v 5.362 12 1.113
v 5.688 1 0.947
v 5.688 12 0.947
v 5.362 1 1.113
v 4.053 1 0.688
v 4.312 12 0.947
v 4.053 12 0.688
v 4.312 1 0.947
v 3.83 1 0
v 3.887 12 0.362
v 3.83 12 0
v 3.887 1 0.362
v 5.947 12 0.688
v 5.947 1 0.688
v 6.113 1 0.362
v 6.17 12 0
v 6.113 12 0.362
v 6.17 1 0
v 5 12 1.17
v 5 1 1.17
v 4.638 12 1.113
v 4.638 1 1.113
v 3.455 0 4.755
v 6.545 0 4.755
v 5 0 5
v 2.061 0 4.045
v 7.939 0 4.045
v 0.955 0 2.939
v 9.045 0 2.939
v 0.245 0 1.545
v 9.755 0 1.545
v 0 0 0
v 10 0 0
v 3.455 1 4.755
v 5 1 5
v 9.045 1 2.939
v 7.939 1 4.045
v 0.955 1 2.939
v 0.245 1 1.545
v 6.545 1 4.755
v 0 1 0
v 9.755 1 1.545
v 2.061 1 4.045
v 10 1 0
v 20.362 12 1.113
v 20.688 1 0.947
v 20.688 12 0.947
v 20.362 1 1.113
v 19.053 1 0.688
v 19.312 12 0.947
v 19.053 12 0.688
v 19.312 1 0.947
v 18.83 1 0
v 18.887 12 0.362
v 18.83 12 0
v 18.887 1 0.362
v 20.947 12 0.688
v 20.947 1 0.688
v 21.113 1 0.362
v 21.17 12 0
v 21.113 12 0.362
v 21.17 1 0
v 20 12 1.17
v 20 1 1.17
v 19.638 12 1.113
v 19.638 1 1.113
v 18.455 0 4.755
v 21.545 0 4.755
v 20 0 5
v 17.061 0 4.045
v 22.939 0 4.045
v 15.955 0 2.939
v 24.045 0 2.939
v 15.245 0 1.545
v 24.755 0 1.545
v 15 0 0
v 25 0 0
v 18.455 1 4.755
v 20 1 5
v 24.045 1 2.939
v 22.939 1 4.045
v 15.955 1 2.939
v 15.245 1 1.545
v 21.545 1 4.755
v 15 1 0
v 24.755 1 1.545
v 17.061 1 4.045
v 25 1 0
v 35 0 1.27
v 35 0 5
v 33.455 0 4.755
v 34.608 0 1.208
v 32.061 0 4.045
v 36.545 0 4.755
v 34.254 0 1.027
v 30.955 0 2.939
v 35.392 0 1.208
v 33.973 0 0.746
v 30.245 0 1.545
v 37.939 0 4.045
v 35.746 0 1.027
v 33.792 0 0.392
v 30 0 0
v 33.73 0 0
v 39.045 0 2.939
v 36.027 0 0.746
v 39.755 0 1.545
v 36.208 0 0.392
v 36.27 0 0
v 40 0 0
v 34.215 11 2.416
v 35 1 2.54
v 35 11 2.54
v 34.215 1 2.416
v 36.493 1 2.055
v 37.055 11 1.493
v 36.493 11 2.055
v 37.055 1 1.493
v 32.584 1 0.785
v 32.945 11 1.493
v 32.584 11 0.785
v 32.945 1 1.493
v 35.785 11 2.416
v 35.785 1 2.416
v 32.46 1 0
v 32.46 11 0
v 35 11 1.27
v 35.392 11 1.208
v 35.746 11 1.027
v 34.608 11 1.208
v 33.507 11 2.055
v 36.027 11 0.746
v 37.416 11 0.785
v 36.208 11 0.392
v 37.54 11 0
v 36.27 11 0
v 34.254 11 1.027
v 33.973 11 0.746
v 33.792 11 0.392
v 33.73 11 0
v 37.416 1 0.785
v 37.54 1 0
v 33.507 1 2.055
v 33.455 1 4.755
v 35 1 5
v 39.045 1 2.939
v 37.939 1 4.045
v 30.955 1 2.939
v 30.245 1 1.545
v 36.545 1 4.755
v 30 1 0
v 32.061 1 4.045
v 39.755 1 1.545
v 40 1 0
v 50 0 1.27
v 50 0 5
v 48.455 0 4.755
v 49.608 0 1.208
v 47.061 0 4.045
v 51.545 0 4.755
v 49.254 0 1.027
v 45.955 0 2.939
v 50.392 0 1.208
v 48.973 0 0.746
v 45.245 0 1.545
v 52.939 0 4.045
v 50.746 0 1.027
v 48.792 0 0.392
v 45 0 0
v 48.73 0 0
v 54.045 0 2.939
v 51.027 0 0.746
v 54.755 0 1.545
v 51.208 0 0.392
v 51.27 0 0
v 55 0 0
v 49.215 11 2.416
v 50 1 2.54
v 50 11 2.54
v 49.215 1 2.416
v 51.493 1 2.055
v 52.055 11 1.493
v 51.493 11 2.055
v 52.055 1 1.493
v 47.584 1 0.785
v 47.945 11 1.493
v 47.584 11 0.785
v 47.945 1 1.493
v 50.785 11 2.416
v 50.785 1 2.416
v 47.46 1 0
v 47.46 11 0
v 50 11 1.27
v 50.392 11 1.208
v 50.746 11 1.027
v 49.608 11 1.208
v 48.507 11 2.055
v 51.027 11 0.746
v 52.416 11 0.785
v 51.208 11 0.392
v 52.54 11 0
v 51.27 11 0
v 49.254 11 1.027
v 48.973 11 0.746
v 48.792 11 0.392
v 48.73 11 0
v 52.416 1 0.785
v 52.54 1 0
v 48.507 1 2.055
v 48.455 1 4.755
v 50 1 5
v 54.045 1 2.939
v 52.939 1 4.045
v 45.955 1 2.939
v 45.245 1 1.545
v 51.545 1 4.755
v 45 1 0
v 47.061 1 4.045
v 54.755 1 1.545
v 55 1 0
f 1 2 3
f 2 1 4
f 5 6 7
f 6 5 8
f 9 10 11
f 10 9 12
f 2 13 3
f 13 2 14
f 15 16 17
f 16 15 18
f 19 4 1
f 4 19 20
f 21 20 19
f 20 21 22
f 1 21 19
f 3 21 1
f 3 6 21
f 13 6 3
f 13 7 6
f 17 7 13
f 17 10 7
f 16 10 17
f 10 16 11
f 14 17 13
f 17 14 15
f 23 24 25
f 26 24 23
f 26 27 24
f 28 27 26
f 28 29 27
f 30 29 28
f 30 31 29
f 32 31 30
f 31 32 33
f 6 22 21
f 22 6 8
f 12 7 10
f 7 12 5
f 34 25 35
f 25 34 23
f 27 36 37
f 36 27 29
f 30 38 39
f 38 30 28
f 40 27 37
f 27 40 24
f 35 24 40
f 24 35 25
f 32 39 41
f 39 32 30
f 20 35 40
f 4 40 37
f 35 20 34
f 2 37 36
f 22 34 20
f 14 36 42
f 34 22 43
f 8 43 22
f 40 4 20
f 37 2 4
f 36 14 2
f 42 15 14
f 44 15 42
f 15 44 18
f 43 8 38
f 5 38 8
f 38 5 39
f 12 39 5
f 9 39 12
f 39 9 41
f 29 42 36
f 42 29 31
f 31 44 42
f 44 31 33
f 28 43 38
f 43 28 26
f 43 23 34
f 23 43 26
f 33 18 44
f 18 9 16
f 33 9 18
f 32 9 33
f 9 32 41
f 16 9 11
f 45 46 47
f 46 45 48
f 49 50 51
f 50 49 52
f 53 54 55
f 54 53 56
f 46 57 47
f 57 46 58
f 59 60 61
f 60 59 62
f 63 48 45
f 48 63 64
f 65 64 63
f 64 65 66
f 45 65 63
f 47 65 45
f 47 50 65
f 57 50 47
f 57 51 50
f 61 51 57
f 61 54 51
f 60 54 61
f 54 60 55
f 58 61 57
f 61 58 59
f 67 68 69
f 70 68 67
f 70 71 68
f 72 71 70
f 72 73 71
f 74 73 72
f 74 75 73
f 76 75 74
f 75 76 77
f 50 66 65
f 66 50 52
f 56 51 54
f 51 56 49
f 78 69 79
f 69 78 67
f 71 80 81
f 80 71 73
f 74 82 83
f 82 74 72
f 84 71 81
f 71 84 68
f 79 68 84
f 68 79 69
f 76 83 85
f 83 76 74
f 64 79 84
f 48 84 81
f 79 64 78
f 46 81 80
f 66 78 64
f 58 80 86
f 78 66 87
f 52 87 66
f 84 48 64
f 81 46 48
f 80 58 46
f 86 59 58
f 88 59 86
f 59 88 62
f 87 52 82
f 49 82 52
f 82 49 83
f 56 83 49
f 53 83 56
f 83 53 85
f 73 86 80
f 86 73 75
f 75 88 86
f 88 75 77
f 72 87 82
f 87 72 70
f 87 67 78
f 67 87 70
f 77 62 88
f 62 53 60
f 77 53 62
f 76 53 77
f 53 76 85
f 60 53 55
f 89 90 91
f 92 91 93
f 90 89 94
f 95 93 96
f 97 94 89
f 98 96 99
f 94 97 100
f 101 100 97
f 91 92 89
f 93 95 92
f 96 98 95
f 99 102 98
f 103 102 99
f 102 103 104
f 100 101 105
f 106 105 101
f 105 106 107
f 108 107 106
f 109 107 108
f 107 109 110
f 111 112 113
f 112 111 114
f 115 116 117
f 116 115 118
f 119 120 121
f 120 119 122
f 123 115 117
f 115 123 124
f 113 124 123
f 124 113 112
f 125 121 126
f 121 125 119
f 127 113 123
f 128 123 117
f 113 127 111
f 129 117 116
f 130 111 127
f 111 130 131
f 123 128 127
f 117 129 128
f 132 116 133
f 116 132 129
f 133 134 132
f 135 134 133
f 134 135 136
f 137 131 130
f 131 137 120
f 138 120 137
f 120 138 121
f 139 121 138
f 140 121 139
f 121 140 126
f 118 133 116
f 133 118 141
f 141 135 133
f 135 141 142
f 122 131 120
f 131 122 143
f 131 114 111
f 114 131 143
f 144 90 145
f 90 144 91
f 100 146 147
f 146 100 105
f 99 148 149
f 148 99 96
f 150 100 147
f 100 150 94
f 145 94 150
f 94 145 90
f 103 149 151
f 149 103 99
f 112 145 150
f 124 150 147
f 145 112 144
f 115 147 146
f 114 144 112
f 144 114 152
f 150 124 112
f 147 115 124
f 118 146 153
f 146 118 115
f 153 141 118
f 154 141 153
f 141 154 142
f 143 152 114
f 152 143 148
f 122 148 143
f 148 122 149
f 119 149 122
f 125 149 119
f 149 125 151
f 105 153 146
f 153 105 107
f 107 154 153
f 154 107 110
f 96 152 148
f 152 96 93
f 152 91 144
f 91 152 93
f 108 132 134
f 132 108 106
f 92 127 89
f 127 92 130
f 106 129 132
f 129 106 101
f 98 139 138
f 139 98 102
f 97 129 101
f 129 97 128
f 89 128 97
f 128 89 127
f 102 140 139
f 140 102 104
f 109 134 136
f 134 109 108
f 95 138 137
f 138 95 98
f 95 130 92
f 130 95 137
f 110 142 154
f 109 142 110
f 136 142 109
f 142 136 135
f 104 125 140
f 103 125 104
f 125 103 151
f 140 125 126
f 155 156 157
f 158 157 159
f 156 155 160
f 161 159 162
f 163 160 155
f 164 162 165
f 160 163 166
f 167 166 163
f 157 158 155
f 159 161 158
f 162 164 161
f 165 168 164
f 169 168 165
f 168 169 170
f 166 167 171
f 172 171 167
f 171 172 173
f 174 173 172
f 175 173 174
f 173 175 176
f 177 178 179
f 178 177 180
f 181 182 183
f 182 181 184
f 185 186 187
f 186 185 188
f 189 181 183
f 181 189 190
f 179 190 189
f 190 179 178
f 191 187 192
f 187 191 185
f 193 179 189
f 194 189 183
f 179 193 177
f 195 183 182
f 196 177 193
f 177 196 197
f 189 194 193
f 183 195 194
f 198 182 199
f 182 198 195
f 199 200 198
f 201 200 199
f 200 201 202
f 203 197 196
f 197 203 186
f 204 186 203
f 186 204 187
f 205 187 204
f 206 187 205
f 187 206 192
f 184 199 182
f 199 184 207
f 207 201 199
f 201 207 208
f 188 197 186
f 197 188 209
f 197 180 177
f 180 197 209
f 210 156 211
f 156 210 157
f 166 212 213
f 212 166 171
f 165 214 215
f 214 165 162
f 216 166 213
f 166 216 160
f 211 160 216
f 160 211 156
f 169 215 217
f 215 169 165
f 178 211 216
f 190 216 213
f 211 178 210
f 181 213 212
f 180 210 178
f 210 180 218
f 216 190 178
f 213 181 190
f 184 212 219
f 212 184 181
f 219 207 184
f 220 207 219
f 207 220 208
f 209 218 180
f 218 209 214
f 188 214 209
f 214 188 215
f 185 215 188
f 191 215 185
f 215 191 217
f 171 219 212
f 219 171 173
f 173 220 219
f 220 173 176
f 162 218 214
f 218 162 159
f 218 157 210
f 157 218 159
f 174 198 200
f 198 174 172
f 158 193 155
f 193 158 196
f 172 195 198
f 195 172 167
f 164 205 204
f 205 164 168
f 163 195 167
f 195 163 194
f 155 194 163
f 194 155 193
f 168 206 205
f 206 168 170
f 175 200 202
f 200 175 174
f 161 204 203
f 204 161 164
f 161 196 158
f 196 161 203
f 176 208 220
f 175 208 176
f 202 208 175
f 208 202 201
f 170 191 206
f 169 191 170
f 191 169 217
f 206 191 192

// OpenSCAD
// [FL_INDEX: keywords="openscad, 3d_parametric, Fastener__Replacement_for_Chicago_Screw, csg_solid" | COT="Parametric OpenSCAD design from 3DCodeverse"]
// Title: Fastener (Replacement for Chicago Screw)

$fn=20;
HeadHeight=1; // [1,1.5,2,2.5,3]
HeadDiameter=10; //[7:15]
SleeveLength=10; //[1:100]
SleeveOutterDiameter=5.08;//[5.00,5.08,6,7,8,9,10]
Play=0.1;// [0.0,0.1,0.2,0.3,0.4,0.5]

HeadRadius=HeadDiameter/2;
SleeveOutterRadius=SleeveOutterDiameter/2;
SleeveInnerRadius=(SleeveOutterRadius/2)-Play;

O1=HeadDiameter/2;
O2=HeadDiameter+10;
O3=(HeadDiameter*2)+15;
O4=(HeadDiameter*3)+20;

translate([O1,0,0]) core();
translate([O2,0,0]) core();
translate([O3,0,0]) outter();
translate([O4,0,0]) outter();

module core() {
	difference() {
		union() {
			rotate([-90,0,0]) cylinder(r=SleeveInnerRadius,h=SleeveLength+(HeadHeight*2));
			rotate([-90,0,0]) cylinder(r=HeadRadius,h=HeadHeight);
		}
		translate([-HeadRadius,0,-HeadRadius]) cube([HeadDiameter+1,SleeveLength+(HeadHeight*2)+1,HeadRadius]);
	}
}

module outter() {
	difference() {
		union() {
			rotate([-90,0,0]) cylinder(r=SleeveOutterRadius,h=SleeveLength+HeadHeight);
			rotate([-90,0,0]) cylinder(r=HeadRadius,h=HeadHeight);
		}
		rotate([-90,0,0]) cylinder(r=SleeveInnerRadius+Play,h=SleeveLength+HeadHeight);
		translate([-HeadRadius,0,-HeadRadius]) cube([HeadDiameter+1,SleeveLength+HeadHeight+1,HeadRadius]);
	}
}
